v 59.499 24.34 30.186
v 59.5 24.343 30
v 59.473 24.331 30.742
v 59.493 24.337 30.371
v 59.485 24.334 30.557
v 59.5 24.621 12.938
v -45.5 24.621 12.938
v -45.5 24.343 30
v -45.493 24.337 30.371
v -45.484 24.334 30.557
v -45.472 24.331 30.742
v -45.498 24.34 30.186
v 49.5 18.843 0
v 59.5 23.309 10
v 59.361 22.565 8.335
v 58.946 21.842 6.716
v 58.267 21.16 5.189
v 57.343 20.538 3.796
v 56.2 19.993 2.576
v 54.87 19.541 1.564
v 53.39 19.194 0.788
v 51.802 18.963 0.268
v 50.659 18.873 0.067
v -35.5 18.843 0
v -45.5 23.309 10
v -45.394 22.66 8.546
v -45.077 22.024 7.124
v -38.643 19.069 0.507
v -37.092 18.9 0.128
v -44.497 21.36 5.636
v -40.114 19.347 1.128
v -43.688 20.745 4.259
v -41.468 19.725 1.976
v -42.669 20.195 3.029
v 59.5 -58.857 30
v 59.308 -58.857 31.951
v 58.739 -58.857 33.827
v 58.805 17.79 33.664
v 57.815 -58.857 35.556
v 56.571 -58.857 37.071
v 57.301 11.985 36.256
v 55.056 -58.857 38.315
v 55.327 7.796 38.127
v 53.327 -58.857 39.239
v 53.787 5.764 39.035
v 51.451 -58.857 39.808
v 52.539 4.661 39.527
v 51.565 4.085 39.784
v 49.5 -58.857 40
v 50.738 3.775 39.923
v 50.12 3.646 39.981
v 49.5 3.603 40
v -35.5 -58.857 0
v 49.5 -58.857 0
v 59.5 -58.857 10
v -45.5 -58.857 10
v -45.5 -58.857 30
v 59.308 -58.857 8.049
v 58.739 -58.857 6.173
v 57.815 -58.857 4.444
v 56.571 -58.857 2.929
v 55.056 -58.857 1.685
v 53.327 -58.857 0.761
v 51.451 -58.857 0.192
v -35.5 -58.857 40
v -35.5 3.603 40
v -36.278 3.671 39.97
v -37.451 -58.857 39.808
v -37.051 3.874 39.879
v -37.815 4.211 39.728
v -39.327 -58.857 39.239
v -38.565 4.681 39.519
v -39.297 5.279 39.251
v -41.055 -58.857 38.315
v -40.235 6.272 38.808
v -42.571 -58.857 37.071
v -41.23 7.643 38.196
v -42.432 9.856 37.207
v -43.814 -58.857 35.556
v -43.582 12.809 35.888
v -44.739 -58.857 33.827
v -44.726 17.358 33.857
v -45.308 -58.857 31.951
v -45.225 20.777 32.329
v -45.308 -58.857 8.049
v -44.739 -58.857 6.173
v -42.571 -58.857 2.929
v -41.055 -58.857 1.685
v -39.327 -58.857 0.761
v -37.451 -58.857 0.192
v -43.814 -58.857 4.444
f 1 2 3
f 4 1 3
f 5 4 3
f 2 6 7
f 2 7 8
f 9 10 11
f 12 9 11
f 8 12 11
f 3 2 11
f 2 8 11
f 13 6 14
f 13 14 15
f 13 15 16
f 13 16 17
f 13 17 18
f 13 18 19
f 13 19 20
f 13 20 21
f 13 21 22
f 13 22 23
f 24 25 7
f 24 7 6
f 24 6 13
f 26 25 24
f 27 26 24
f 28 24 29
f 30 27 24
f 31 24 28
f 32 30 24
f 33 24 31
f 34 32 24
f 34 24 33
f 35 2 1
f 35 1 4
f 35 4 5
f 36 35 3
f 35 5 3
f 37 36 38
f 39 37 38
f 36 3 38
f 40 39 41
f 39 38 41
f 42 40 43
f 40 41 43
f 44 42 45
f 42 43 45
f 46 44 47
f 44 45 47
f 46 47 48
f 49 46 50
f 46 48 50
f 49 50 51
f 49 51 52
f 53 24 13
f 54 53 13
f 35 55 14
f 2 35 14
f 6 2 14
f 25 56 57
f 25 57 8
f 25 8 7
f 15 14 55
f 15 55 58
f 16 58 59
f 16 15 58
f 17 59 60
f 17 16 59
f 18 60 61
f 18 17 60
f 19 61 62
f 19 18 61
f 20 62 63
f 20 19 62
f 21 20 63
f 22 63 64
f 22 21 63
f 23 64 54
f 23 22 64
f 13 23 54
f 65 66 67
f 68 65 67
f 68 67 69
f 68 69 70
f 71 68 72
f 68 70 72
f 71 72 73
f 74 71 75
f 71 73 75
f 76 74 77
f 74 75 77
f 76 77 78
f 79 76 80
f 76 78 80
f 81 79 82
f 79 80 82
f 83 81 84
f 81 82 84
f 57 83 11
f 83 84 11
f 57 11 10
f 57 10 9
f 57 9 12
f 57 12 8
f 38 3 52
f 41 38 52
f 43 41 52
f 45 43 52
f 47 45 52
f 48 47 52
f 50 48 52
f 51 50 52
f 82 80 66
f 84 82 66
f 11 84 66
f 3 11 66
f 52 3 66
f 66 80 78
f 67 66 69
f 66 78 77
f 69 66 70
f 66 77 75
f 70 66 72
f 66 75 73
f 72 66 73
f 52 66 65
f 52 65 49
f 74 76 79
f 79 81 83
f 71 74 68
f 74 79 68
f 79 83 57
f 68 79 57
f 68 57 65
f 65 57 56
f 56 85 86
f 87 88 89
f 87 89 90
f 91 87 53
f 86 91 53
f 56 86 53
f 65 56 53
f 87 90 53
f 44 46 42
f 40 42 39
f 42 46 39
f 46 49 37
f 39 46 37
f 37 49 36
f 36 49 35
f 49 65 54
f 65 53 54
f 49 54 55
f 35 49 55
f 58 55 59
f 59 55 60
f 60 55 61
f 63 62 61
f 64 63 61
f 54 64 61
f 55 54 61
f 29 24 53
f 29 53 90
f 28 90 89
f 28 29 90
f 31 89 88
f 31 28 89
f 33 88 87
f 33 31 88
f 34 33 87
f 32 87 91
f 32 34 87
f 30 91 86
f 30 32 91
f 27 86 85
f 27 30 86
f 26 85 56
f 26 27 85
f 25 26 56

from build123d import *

# Parameters (mm, degrees)
SKETCH1_W           = 105
SKETCH1_H           = 90
BOSS_EXTRUDE1_DEPTH = 40
FILLET5_R           = 10.000000066
FILLET6_R           = 10.000000066
FILLET7_R           = 10.000000066
FILLET8_R           = 10.000000066
CHAMFER14_SIZE      = 27.54
CHAMFER14_SIZE_2    = 12.3
CHAMFER15_SIZE      = 415.05734945
CHAMFER15_SIZE_2    = 7.46


with BuildPart() as part:
    # Sketch1 → Boss-Extrude1 (new body)
    with BuildSketch(Plane.XY):
        with Locations((7.000234735, -13.857374392)):
            Rectangle(SKETCH1_W, SKETCH1_H)
    extrude(amount=BOSS_EXTRUDE1_DEPTH)

    # Fillet5
    fillet5_edges = [part.edges().sort_by_distance(p)[0] for p in [
        (59.500234735, -13.857374392, 40),
    ]]
    fillet(fillet5_edges, radius=FILLET5_R)

    # Fillet6
    fillet6_edges = [part.edges().sort_by_distance(p)[0] for p in [
        (-45.499765265, -13.857374392, 40),
    ]]
    fillet(fillet6_edges, radius=FILLET6_R)

    # Fillet7
    fillet7_edges = [part.edges().sort_by_distance(p)[0] for p in [
        (59.500234735, -13.857374392, 0),
    ]]
    fillet(fillet7_edges, radius=FILLET7_R)

    # Fillet8
    fillet8_edges = [part.edges().sort_by_distance(p)[0] for p in [
        (-45.499765265, -13.857374392, 0),
    ]]
    fillet(fillet8_edges, radius=FILLET8_R)

    # Chamfer14
    # the kernel refuses this chamfer: 27.54, 12.3 mm, written as the material it takes off along each edge
    with BuildSketch(Plane(origin=(-106.873201315, 31.142625608, 0), x_dir=(0, 0.015735241575877565, 0.99987619342224), z_dir=(1, 0, 0))) as chamfer14_piece_1:
        Polygon((CHAMFER14_SIZE * 0.999876193422, CHAMFER14_SIZE * 0.0157352415759), (-CHAMFER14_SIZE_2 * 0.0157352415759, CHAMFER14_SIZE_2 * 0.999876193422), (0, 0), align=None)
    extrude(amount=227.7468721, mode=Mode.SUBTRACT)
    with BuildSketch(Plane(origin=(-106.873201315, 31.142625608, 40), x_dir=(0, 0.07864976650804911, -0.9969023092701859), z_dir=(1, 0, 0))) as chamfer14_piece_2:
        Polygon((CHAMFER14_SIZE_2 * 0.99690230927, -CHAMFER14_SIZE_2 * 0.078649766508), (-CHAMFER14_SIZE * 0.078649766508, -CHAMFER14_SIZE * 0.99690230927), (0, 0), align=None)
    extrude(amount=227.7468721, mode=Mode.SUBTRACT)

    # Chamfer15
    # the kernel refuses this chamfer: 415.05734945, 7.46 mm, written as the material it takes off along each edge
    with BuildSketch(Plane(origin=(-1124.643578574, 31.142625608, 27.7), x_dir=(0, 0.0006265203958835344, -0.9999998037360776), z_dir=(1, 0, 0))) as chamfer15_piece_1:
        Polygon((CHAMFER15_SIZE * 0.999999803737, -CHAMFER15_SIZE * 0.000626520395884), (-CHAMFER15_SIZE_2 * 0.408370910279, -CHAMFER15_SIZE_2 * 0.912816082044), (0, 0), align=None)
    extrude(amount=2263.287626617, mode=Mode.SUBTRACT)


solid = part.part
